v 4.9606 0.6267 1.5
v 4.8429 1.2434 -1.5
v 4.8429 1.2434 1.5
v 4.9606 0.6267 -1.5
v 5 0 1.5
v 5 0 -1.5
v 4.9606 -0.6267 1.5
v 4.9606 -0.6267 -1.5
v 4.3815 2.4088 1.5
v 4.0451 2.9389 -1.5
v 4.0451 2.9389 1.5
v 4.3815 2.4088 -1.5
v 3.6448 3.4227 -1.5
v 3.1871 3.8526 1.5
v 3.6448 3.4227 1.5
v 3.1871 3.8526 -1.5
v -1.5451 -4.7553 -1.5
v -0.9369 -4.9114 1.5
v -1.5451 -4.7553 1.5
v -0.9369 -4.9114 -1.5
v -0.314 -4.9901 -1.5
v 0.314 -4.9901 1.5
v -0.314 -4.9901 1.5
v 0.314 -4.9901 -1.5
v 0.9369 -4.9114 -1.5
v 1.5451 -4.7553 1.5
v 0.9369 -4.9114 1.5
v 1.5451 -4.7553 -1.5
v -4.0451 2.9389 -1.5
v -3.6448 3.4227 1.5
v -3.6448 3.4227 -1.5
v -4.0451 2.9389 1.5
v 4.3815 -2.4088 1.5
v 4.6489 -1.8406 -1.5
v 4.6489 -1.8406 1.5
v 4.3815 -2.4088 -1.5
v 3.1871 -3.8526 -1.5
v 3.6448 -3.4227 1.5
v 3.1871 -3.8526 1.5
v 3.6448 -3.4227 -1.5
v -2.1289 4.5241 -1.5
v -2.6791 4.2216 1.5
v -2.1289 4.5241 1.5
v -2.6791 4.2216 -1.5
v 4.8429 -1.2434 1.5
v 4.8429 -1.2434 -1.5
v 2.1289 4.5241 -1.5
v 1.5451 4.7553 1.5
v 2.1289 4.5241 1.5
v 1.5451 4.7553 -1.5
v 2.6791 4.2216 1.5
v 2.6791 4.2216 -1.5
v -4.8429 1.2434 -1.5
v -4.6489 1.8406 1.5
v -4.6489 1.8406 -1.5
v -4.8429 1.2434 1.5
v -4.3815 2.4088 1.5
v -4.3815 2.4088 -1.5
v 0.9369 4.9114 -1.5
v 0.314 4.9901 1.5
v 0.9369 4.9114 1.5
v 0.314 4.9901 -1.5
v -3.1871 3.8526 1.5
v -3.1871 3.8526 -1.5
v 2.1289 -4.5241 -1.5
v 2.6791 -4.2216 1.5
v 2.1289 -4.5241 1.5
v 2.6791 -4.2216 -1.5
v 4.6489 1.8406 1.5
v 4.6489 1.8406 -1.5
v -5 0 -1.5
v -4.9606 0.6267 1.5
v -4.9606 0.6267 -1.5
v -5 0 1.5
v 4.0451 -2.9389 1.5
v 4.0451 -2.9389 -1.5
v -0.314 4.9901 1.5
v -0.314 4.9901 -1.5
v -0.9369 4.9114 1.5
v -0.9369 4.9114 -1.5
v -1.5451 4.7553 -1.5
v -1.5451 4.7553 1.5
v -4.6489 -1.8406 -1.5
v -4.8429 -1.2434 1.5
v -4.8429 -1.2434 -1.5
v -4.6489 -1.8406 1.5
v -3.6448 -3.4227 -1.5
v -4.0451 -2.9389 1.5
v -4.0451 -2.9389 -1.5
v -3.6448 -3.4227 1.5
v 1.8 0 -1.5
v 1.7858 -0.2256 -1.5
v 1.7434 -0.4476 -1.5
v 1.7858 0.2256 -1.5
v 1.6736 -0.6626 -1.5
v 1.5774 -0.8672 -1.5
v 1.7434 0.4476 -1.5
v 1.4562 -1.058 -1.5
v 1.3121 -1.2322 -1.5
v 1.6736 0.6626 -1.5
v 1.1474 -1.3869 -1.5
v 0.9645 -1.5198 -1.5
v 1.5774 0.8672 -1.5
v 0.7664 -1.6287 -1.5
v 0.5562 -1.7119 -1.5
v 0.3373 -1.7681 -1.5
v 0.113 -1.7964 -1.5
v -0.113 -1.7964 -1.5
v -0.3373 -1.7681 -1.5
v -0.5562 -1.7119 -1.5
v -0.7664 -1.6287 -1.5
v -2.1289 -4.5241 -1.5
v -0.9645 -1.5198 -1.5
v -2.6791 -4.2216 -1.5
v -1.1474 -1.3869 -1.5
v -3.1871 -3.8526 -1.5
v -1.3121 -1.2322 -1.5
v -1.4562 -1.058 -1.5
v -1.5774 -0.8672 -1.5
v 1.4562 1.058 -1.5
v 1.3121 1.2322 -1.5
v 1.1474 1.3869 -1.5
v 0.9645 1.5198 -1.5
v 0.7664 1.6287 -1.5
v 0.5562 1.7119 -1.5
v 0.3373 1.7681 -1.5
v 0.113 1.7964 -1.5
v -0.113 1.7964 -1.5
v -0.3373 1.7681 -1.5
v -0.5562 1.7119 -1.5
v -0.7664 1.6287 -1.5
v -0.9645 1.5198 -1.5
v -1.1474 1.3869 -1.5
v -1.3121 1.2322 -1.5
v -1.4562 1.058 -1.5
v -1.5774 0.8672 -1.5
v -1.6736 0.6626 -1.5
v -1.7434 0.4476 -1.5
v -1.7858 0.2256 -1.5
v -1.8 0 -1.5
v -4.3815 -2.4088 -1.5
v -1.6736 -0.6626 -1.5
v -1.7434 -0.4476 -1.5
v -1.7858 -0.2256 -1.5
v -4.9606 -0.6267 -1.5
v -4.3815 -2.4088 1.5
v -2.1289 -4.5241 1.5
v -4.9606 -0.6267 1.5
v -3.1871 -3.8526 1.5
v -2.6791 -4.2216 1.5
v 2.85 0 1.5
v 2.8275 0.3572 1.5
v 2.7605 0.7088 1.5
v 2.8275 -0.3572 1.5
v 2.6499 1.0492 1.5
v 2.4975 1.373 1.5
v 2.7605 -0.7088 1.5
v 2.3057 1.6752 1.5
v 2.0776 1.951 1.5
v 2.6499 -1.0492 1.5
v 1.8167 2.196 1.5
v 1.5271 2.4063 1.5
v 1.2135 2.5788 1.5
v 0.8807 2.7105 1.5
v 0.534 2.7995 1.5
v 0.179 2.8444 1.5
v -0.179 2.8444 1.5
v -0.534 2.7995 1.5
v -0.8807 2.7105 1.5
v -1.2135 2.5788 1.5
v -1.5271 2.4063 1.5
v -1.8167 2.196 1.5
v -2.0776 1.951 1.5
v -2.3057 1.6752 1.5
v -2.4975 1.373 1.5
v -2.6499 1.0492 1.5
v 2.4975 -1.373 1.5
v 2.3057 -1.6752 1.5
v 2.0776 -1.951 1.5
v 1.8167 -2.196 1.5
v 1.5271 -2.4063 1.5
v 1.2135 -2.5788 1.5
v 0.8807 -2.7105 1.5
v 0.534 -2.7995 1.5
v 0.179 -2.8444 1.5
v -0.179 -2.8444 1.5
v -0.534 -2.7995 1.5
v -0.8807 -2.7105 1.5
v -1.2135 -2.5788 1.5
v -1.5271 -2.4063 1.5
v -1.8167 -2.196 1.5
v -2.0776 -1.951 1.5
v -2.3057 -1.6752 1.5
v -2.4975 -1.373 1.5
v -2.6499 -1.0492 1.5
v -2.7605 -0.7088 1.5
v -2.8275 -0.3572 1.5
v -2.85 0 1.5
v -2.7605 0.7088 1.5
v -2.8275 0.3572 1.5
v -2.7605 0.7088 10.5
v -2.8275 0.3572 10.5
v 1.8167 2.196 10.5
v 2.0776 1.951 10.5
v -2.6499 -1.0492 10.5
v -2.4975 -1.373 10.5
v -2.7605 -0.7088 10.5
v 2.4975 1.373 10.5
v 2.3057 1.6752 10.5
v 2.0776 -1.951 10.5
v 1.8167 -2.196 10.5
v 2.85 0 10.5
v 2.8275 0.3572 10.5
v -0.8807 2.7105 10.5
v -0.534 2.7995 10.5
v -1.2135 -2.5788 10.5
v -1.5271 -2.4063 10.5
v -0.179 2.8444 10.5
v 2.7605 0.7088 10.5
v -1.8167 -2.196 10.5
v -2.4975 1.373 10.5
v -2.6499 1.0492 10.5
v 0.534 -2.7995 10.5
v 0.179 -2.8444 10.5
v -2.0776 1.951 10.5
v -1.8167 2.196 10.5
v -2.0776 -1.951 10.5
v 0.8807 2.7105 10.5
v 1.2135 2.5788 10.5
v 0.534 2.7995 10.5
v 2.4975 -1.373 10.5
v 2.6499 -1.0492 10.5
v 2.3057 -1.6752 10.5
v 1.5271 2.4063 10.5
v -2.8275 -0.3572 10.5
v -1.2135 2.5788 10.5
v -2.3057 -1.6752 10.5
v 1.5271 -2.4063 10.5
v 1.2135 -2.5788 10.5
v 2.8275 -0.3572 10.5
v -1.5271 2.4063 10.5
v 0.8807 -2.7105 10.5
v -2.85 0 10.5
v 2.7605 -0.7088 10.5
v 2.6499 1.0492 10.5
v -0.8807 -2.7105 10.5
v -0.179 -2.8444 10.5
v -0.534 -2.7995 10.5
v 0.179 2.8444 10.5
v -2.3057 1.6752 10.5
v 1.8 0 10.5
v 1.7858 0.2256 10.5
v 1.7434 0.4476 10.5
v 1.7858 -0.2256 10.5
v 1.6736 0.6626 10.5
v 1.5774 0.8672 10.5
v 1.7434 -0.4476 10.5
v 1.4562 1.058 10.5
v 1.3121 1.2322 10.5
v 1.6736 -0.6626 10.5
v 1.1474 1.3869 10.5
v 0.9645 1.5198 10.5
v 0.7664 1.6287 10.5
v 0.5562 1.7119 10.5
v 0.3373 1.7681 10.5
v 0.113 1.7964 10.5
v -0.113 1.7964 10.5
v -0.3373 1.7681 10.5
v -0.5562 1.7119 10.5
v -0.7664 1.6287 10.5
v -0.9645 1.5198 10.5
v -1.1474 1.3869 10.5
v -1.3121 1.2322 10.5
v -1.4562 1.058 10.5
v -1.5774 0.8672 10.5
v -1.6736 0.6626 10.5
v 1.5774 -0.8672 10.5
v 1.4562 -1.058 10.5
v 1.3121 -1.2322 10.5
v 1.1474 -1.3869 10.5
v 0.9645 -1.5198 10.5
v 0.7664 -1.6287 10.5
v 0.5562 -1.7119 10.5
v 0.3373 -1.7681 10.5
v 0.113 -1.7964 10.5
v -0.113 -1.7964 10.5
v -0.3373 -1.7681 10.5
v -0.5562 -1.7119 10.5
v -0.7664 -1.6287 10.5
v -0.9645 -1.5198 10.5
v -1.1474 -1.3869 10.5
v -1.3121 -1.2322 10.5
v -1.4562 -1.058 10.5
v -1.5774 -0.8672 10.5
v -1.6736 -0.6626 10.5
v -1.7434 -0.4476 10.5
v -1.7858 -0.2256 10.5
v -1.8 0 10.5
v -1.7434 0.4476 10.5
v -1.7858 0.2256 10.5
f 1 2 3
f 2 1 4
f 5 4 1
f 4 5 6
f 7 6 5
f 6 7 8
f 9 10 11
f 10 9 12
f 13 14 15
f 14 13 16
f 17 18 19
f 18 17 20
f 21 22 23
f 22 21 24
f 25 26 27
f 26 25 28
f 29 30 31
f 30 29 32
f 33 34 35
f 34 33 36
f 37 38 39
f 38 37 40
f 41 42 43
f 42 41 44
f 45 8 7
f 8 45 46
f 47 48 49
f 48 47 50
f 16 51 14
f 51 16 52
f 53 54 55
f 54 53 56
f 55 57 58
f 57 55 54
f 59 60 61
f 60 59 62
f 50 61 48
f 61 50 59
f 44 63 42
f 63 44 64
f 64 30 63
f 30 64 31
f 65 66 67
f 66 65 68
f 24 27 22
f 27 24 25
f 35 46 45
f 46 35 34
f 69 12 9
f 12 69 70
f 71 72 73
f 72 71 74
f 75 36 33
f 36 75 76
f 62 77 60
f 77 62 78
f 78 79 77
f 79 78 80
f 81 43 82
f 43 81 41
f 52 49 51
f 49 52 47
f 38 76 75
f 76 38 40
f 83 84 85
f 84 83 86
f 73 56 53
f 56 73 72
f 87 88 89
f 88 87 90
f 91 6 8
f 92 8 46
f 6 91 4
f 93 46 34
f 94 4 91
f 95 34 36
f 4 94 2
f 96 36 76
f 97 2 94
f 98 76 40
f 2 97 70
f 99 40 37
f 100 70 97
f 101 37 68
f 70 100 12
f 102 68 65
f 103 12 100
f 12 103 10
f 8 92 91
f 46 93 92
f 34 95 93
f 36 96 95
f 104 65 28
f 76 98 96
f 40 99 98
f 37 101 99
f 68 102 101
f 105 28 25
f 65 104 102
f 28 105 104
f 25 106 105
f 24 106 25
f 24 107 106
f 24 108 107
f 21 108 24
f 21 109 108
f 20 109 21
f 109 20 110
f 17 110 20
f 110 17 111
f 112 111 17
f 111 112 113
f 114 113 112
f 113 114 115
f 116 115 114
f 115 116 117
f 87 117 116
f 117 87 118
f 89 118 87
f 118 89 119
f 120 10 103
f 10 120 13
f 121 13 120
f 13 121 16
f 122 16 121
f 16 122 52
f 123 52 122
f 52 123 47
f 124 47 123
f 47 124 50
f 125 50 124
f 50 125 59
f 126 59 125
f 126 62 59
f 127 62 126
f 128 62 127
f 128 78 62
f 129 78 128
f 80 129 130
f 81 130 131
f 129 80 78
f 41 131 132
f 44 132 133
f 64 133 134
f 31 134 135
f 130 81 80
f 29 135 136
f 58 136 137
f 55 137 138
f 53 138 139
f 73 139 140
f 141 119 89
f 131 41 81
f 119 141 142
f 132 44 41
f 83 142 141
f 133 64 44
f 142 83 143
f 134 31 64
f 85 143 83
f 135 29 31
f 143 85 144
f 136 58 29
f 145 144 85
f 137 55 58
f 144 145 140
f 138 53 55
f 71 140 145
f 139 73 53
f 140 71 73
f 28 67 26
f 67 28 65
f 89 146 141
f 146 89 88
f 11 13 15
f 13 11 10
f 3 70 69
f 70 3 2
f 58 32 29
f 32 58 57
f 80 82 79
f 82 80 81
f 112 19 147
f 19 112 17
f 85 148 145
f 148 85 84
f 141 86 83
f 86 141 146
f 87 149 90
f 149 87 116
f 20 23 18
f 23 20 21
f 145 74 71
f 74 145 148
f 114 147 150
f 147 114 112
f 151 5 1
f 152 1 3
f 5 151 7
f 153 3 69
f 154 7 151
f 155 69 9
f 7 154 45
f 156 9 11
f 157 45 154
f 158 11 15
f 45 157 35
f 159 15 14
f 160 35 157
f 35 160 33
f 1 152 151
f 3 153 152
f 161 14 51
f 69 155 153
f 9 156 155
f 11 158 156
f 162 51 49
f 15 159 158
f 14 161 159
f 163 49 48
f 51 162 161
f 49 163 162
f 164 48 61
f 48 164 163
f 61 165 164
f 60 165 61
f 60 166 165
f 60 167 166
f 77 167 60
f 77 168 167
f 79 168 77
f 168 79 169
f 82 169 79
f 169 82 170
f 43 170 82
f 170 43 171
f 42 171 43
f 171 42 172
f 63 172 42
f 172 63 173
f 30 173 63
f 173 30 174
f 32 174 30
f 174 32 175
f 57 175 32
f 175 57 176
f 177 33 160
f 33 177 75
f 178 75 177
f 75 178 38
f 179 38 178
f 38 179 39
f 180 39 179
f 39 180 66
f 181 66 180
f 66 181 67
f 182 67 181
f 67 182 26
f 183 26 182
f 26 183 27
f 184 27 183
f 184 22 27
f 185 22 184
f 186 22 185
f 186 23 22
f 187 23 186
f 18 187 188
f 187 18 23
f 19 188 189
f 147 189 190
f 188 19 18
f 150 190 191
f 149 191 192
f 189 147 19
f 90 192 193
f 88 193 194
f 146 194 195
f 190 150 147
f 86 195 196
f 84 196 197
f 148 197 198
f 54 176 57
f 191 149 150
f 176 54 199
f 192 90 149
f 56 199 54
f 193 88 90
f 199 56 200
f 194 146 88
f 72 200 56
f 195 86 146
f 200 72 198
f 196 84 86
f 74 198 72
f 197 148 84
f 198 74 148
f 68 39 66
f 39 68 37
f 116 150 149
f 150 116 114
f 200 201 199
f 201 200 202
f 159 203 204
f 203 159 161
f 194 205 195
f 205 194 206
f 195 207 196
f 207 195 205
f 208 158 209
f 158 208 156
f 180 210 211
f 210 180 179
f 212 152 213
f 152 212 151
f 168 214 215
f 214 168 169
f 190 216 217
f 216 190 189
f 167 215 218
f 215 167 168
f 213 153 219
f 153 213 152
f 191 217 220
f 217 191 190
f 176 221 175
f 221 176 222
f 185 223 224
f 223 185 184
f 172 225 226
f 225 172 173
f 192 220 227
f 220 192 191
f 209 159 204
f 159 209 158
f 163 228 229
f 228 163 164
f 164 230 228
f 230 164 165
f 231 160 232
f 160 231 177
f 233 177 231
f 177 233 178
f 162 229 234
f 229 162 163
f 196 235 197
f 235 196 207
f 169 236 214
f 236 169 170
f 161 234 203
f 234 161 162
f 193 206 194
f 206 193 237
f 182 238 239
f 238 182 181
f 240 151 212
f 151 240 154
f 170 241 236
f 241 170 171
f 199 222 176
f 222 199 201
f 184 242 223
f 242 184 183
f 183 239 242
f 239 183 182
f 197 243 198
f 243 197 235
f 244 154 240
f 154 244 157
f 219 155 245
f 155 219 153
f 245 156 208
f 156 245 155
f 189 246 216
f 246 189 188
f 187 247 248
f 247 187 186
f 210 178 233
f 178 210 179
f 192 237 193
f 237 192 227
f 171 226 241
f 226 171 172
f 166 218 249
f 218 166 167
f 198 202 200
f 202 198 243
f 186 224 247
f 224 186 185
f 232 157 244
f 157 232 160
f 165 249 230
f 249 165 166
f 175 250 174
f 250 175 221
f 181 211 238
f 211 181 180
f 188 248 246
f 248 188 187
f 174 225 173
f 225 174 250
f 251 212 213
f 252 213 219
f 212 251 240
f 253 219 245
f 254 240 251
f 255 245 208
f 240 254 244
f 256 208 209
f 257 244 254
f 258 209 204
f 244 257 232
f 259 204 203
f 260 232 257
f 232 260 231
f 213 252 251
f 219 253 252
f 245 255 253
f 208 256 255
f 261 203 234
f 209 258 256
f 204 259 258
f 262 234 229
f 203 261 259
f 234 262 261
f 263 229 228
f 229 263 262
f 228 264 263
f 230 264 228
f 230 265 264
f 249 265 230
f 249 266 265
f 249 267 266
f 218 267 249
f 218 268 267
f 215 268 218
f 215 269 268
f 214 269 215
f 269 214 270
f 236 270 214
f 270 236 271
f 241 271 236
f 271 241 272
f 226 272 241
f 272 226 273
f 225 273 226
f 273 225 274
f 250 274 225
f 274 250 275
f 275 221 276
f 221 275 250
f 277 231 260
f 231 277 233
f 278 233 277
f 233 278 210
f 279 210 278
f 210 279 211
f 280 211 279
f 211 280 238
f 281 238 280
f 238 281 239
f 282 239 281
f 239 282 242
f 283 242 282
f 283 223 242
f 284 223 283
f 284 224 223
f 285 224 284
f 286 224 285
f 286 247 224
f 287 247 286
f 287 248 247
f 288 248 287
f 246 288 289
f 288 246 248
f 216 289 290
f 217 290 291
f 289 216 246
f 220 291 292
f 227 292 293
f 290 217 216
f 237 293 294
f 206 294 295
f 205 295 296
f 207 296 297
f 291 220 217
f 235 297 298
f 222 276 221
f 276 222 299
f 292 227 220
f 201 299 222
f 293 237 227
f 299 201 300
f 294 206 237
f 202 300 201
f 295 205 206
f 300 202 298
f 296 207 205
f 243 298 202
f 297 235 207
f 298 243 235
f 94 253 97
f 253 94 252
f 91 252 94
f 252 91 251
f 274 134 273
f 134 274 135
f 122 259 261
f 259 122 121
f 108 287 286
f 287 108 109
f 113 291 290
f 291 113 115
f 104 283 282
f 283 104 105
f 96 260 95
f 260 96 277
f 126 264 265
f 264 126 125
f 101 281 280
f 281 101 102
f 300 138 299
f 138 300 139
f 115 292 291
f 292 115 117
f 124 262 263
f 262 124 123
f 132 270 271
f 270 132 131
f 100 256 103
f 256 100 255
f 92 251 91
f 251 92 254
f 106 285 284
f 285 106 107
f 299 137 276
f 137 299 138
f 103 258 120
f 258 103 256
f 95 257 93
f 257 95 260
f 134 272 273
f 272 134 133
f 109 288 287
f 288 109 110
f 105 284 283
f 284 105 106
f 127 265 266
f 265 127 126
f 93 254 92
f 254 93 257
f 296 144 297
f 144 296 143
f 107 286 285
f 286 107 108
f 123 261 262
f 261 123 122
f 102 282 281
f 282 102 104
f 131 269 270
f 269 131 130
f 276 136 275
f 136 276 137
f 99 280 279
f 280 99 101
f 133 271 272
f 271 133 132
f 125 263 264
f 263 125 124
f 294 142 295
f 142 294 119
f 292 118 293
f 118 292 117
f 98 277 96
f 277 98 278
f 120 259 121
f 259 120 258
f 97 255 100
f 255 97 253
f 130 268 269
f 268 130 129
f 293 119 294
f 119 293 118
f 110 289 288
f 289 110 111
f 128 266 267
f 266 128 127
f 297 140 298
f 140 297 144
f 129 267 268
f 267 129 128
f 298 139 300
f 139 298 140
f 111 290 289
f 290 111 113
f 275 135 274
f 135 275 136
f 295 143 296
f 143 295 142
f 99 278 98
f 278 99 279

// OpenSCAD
$fn = 50;


difference() {
	union() {
		translate(v = [0, 0, -1.5000000000]) {
			rotate(a = [0, 0, 0]) {
				cylinder(h = 3, r = 5.0000000000);
			}
		}
		translate(v = [0, 0, -1.5000000000]) {
			rotate(a = [0, 0, 0]) {
				cylinder(h = 12, r = 2.8500000000);
			}
		}
	}
	union() {
		translate(v = [0, 0, -125.0000000000]) {
			rotate(a = [0, 0, 0]) {
				cylinder(h = 250, r = 1.8000000000);
			}
		}
	}
}
